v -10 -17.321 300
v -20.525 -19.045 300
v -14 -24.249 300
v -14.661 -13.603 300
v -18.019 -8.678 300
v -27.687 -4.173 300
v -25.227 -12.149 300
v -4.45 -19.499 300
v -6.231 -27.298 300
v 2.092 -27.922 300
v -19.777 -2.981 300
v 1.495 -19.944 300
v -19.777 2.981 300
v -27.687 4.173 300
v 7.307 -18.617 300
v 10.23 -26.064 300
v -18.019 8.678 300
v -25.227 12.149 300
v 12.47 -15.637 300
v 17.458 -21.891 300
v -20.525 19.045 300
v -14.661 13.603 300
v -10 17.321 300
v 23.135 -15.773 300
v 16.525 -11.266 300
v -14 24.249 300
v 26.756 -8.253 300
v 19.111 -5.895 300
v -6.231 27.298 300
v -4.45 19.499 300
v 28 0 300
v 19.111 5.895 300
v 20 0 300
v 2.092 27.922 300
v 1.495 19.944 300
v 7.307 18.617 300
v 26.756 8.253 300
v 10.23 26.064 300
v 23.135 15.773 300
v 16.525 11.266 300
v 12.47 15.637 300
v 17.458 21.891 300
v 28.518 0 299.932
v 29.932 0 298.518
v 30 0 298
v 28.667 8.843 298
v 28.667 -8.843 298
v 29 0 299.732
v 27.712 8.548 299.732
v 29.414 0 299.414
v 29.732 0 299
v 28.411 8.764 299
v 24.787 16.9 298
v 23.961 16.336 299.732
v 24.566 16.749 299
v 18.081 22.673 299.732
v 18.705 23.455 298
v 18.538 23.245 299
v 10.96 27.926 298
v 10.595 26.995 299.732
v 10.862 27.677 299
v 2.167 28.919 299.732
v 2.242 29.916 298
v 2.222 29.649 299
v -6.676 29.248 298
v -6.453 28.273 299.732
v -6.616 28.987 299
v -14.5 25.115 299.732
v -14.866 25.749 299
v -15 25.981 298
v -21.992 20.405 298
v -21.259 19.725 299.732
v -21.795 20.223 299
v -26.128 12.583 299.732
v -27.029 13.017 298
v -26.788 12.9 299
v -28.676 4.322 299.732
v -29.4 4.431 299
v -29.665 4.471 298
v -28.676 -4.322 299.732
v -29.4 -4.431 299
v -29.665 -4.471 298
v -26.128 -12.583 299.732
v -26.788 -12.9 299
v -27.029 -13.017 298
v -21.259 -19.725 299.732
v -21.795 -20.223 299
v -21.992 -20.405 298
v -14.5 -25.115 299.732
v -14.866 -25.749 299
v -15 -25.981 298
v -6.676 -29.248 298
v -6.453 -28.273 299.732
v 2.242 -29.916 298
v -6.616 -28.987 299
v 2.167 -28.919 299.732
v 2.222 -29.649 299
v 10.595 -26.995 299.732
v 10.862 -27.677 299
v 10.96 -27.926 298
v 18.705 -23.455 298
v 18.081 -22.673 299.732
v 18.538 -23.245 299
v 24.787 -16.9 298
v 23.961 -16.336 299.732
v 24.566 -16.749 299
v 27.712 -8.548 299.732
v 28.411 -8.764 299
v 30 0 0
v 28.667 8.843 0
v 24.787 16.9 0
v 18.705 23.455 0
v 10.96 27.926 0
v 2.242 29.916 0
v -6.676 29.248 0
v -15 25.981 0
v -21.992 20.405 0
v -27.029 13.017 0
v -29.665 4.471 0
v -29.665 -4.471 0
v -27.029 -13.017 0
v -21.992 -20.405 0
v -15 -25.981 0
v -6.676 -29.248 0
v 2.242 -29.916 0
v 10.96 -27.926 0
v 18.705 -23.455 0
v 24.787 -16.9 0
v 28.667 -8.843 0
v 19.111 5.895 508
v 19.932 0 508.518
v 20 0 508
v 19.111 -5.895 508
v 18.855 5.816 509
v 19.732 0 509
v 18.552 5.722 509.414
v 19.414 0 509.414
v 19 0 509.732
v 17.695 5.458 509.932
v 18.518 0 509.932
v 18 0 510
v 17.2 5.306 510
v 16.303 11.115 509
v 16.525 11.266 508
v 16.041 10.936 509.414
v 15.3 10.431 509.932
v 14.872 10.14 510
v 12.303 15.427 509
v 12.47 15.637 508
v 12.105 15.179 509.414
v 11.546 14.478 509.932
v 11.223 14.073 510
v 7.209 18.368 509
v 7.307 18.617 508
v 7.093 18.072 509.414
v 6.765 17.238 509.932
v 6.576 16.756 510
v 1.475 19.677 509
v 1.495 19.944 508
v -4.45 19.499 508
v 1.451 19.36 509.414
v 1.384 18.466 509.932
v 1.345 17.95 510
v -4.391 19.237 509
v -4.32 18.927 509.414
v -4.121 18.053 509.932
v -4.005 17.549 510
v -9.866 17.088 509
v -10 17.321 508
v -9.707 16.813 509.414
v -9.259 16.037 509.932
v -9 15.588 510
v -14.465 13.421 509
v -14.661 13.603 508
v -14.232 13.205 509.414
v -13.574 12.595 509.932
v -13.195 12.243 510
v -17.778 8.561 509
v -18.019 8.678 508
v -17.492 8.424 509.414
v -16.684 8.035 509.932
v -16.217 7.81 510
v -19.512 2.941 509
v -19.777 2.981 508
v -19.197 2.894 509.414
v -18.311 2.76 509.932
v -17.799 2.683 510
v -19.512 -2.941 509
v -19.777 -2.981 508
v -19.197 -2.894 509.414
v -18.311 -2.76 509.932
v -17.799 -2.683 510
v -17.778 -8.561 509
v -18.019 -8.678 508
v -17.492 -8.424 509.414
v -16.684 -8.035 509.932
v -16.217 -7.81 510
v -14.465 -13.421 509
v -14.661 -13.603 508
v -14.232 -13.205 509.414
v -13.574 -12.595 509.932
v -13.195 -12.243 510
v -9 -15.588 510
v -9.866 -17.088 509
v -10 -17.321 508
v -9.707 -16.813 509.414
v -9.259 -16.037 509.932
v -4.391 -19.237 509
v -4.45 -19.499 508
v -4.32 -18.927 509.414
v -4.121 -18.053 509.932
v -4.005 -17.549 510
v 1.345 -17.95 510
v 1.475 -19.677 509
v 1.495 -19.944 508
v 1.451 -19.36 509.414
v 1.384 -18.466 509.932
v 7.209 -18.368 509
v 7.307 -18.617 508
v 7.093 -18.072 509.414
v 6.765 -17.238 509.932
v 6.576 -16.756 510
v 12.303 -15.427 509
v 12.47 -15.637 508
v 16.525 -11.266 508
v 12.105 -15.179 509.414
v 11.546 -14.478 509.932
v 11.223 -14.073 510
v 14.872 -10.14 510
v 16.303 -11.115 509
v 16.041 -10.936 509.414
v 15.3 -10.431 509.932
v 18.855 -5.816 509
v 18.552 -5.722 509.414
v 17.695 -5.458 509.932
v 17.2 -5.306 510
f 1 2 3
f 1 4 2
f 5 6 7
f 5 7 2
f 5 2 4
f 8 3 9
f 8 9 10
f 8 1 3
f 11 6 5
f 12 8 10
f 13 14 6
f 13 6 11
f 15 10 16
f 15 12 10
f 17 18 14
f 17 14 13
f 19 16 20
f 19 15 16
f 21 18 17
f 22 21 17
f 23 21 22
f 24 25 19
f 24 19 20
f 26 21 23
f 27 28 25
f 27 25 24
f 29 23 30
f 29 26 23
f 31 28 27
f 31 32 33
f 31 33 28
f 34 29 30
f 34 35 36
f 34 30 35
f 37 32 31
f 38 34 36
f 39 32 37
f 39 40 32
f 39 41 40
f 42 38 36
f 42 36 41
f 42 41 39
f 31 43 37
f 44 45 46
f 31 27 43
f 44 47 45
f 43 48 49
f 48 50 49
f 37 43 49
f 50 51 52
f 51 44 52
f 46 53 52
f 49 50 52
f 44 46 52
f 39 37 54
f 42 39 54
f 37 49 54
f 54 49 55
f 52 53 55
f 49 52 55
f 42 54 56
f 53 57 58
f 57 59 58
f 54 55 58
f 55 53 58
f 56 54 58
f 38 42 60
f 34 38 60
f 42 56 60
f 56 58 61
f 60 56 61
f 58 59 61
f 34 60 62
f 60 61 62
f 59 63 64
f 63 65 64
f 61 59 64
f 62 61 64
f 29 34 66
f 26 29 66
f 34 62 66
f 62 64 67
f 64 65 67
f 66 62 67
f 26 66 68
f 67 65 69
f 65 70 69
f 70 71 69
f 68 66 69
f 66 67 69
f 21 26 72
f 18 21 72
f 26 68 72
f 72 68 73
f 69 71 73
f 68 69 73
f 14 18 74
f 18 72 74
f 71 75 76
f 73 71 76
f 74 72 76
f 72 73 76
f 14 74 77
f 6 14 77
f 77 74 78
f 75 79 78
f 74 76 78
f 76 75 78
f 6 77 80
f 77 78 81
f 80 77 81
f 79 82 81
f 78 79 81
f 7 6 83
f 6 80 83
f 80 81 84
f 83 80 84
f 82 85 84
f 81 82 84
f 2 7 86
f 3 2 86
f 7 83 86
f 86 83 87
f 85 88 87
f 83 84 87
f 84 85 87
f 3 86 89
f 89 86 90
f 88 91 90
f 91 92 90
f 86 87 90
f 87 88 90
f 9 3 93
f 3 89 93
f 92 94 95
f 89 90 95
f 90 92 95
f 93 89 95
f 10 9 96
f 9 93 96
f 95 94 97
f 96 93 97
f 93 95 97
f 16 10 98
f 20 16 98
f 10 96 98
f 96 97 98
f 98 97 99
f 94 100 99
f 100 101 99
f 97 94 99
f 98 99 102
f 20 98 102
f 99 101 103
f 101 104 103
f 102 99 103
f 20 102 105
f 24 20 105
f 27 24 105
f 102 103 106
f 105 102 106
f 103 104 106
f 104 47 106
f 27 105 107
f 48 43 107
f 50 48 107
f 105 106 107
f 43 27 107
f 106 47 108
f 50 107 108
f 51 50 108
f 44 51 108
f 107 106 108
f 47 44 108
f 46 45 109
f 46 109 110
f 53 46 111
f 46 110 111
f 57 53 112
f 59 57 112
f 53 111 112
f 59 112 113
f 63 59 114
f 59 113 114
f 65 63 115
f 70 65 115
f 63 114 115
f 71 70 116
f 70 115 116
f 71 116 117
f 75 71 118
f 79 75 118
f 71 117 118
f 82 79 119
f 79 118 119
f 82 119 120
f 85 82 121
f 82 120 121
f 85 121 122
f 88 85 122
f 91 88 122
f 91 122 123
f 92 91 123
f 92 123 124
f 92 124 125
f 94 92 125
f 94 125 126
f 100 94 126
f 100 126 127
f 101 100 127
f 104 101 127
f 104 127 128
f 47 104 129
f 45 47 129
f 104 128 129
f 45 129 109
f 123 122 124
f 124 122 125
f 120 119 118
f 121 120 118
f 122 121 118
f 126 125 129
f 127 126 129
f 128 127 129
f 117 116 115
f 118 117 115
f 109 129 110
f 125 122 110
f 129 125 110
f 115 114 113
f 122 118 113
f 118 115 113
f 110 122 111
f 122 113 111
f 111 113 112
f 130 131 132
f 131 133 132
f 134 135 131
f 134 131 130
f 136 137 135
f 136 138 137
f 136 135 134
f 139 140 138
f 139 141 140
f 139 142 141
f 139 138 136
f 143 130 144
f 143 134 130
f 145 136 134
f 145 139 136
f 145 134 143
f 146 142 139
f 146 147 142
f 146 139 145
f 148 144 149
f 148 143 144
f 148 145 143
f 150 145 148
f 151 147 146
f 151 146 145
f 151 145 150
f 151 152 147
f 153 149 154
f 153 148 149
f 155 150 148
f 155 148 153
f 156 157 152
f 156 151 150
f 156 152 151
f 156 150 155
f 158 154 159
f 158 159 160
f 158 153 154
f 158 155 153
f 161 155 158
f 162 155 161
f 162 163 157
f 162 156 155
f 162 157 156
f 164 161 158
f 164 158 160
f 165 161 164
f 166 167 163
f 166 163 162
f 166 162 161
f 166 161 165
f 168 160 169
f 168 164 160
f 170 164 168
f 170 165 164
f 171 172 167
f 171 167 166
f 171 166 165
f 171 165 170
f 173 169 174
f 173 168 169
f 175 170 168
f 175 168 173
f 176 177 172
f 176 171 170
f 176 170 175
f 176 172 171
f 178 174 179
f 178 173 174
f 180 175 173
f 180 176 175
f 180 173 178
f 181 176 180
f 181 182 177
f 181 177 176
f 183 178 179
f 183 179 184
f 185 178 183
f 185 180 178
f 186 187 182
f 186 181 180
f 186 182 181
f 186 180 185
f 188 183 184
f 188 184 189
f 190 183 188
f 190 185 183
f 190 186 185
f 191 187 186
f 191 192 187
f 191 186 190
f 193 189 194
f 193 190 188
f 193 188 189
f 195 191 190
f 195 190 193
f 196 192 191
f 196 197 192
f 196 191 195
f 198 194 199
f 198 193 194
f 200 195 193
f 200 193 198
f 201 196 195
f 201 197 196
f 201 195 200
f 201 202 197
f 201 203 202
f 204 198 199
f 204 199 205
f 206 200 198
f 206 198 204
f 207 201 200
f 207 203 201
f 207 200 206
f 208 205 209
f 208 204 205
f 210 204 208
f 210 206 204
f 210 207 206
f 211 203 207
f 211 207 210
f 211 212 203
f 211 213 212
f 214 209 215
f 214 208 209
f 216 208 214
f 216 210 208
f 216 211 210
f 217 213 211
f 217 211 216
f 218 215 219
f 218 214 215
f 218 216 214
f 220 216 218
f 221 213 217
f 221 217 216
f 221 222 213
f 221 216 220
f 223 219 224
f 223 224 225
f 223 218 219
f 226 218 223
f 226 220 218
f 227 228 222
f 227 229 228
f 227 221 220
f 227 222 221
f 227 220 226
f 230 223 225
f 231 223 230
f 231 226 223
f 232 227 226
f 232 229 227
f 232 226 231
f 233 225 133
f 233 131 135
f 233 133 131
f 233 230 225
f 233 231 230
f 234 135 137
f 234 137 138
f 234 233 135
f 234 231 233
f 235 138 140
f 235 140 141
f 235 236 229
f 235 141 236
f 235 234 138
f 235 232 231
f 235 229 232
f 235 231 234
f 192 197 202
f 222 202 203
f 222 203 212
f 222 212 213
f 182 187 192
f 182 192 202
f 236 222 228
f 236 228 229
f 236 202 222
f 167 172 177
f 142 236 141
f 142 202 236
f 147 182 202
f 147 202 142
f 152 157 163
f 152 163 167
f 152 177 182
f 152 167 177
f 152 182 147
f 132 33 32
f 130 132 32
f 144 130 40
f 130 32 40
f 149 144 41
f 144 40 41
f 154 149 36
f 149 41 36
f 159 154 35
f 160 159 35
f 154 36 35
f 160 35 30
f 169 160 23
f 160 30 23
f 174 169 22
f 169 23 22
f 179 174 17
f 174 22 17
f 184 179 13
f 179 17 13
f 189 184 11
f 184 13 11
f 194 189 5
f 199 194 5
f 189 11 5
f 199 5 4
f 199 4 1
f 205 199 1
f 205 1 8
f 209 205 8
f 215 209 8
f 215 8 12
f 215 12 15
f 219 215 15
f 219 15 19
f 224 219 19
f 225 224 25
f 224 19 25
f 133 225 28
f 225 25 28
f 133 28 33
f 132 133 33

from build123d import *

# Parameters (mm, degrees)
SKETCH2_R           = 30
BOSS_EXTRUDE1_DEPTH = 300
SKETCH3_R           = 20
BOSS_EXTRUDE2_DEPTH = 210
FILLET1_R           = 2
FILLET2_R           = 2


with BuildPart() as part:
    # Sketch2 → Boss-Extrude1 (new body)
    with BuildSketch(Plane.XY):
        Circle(SKETCH2_R)
    extrude(amount=BOSS_EXTRUDE1_DEPTH)

    # Sketch3 → Boss-Extrude2 (add)
    with BuildSketch(Plane.XY.offset(300)):
        Circle(SKETCH3_R)
    extrude(amount=BOSS_EXTRUDE2_DEPTH)

    # Fillet1
    fillet1_edges = [part.edges().sort_by_distance(p)[0] for p in [
        (-20, 0, 510),
    ]]
    fillet(fillet1_edges, radius=FILLET1_R)

    # Fillet2
    fillet2_edges = [part.edges().sort_by_distance(p)[0] for p in [
        (-30, 0, 300),
    ]]
    fillet(fillet2_edges, radius=FILLET2_R)


solid = part.part
